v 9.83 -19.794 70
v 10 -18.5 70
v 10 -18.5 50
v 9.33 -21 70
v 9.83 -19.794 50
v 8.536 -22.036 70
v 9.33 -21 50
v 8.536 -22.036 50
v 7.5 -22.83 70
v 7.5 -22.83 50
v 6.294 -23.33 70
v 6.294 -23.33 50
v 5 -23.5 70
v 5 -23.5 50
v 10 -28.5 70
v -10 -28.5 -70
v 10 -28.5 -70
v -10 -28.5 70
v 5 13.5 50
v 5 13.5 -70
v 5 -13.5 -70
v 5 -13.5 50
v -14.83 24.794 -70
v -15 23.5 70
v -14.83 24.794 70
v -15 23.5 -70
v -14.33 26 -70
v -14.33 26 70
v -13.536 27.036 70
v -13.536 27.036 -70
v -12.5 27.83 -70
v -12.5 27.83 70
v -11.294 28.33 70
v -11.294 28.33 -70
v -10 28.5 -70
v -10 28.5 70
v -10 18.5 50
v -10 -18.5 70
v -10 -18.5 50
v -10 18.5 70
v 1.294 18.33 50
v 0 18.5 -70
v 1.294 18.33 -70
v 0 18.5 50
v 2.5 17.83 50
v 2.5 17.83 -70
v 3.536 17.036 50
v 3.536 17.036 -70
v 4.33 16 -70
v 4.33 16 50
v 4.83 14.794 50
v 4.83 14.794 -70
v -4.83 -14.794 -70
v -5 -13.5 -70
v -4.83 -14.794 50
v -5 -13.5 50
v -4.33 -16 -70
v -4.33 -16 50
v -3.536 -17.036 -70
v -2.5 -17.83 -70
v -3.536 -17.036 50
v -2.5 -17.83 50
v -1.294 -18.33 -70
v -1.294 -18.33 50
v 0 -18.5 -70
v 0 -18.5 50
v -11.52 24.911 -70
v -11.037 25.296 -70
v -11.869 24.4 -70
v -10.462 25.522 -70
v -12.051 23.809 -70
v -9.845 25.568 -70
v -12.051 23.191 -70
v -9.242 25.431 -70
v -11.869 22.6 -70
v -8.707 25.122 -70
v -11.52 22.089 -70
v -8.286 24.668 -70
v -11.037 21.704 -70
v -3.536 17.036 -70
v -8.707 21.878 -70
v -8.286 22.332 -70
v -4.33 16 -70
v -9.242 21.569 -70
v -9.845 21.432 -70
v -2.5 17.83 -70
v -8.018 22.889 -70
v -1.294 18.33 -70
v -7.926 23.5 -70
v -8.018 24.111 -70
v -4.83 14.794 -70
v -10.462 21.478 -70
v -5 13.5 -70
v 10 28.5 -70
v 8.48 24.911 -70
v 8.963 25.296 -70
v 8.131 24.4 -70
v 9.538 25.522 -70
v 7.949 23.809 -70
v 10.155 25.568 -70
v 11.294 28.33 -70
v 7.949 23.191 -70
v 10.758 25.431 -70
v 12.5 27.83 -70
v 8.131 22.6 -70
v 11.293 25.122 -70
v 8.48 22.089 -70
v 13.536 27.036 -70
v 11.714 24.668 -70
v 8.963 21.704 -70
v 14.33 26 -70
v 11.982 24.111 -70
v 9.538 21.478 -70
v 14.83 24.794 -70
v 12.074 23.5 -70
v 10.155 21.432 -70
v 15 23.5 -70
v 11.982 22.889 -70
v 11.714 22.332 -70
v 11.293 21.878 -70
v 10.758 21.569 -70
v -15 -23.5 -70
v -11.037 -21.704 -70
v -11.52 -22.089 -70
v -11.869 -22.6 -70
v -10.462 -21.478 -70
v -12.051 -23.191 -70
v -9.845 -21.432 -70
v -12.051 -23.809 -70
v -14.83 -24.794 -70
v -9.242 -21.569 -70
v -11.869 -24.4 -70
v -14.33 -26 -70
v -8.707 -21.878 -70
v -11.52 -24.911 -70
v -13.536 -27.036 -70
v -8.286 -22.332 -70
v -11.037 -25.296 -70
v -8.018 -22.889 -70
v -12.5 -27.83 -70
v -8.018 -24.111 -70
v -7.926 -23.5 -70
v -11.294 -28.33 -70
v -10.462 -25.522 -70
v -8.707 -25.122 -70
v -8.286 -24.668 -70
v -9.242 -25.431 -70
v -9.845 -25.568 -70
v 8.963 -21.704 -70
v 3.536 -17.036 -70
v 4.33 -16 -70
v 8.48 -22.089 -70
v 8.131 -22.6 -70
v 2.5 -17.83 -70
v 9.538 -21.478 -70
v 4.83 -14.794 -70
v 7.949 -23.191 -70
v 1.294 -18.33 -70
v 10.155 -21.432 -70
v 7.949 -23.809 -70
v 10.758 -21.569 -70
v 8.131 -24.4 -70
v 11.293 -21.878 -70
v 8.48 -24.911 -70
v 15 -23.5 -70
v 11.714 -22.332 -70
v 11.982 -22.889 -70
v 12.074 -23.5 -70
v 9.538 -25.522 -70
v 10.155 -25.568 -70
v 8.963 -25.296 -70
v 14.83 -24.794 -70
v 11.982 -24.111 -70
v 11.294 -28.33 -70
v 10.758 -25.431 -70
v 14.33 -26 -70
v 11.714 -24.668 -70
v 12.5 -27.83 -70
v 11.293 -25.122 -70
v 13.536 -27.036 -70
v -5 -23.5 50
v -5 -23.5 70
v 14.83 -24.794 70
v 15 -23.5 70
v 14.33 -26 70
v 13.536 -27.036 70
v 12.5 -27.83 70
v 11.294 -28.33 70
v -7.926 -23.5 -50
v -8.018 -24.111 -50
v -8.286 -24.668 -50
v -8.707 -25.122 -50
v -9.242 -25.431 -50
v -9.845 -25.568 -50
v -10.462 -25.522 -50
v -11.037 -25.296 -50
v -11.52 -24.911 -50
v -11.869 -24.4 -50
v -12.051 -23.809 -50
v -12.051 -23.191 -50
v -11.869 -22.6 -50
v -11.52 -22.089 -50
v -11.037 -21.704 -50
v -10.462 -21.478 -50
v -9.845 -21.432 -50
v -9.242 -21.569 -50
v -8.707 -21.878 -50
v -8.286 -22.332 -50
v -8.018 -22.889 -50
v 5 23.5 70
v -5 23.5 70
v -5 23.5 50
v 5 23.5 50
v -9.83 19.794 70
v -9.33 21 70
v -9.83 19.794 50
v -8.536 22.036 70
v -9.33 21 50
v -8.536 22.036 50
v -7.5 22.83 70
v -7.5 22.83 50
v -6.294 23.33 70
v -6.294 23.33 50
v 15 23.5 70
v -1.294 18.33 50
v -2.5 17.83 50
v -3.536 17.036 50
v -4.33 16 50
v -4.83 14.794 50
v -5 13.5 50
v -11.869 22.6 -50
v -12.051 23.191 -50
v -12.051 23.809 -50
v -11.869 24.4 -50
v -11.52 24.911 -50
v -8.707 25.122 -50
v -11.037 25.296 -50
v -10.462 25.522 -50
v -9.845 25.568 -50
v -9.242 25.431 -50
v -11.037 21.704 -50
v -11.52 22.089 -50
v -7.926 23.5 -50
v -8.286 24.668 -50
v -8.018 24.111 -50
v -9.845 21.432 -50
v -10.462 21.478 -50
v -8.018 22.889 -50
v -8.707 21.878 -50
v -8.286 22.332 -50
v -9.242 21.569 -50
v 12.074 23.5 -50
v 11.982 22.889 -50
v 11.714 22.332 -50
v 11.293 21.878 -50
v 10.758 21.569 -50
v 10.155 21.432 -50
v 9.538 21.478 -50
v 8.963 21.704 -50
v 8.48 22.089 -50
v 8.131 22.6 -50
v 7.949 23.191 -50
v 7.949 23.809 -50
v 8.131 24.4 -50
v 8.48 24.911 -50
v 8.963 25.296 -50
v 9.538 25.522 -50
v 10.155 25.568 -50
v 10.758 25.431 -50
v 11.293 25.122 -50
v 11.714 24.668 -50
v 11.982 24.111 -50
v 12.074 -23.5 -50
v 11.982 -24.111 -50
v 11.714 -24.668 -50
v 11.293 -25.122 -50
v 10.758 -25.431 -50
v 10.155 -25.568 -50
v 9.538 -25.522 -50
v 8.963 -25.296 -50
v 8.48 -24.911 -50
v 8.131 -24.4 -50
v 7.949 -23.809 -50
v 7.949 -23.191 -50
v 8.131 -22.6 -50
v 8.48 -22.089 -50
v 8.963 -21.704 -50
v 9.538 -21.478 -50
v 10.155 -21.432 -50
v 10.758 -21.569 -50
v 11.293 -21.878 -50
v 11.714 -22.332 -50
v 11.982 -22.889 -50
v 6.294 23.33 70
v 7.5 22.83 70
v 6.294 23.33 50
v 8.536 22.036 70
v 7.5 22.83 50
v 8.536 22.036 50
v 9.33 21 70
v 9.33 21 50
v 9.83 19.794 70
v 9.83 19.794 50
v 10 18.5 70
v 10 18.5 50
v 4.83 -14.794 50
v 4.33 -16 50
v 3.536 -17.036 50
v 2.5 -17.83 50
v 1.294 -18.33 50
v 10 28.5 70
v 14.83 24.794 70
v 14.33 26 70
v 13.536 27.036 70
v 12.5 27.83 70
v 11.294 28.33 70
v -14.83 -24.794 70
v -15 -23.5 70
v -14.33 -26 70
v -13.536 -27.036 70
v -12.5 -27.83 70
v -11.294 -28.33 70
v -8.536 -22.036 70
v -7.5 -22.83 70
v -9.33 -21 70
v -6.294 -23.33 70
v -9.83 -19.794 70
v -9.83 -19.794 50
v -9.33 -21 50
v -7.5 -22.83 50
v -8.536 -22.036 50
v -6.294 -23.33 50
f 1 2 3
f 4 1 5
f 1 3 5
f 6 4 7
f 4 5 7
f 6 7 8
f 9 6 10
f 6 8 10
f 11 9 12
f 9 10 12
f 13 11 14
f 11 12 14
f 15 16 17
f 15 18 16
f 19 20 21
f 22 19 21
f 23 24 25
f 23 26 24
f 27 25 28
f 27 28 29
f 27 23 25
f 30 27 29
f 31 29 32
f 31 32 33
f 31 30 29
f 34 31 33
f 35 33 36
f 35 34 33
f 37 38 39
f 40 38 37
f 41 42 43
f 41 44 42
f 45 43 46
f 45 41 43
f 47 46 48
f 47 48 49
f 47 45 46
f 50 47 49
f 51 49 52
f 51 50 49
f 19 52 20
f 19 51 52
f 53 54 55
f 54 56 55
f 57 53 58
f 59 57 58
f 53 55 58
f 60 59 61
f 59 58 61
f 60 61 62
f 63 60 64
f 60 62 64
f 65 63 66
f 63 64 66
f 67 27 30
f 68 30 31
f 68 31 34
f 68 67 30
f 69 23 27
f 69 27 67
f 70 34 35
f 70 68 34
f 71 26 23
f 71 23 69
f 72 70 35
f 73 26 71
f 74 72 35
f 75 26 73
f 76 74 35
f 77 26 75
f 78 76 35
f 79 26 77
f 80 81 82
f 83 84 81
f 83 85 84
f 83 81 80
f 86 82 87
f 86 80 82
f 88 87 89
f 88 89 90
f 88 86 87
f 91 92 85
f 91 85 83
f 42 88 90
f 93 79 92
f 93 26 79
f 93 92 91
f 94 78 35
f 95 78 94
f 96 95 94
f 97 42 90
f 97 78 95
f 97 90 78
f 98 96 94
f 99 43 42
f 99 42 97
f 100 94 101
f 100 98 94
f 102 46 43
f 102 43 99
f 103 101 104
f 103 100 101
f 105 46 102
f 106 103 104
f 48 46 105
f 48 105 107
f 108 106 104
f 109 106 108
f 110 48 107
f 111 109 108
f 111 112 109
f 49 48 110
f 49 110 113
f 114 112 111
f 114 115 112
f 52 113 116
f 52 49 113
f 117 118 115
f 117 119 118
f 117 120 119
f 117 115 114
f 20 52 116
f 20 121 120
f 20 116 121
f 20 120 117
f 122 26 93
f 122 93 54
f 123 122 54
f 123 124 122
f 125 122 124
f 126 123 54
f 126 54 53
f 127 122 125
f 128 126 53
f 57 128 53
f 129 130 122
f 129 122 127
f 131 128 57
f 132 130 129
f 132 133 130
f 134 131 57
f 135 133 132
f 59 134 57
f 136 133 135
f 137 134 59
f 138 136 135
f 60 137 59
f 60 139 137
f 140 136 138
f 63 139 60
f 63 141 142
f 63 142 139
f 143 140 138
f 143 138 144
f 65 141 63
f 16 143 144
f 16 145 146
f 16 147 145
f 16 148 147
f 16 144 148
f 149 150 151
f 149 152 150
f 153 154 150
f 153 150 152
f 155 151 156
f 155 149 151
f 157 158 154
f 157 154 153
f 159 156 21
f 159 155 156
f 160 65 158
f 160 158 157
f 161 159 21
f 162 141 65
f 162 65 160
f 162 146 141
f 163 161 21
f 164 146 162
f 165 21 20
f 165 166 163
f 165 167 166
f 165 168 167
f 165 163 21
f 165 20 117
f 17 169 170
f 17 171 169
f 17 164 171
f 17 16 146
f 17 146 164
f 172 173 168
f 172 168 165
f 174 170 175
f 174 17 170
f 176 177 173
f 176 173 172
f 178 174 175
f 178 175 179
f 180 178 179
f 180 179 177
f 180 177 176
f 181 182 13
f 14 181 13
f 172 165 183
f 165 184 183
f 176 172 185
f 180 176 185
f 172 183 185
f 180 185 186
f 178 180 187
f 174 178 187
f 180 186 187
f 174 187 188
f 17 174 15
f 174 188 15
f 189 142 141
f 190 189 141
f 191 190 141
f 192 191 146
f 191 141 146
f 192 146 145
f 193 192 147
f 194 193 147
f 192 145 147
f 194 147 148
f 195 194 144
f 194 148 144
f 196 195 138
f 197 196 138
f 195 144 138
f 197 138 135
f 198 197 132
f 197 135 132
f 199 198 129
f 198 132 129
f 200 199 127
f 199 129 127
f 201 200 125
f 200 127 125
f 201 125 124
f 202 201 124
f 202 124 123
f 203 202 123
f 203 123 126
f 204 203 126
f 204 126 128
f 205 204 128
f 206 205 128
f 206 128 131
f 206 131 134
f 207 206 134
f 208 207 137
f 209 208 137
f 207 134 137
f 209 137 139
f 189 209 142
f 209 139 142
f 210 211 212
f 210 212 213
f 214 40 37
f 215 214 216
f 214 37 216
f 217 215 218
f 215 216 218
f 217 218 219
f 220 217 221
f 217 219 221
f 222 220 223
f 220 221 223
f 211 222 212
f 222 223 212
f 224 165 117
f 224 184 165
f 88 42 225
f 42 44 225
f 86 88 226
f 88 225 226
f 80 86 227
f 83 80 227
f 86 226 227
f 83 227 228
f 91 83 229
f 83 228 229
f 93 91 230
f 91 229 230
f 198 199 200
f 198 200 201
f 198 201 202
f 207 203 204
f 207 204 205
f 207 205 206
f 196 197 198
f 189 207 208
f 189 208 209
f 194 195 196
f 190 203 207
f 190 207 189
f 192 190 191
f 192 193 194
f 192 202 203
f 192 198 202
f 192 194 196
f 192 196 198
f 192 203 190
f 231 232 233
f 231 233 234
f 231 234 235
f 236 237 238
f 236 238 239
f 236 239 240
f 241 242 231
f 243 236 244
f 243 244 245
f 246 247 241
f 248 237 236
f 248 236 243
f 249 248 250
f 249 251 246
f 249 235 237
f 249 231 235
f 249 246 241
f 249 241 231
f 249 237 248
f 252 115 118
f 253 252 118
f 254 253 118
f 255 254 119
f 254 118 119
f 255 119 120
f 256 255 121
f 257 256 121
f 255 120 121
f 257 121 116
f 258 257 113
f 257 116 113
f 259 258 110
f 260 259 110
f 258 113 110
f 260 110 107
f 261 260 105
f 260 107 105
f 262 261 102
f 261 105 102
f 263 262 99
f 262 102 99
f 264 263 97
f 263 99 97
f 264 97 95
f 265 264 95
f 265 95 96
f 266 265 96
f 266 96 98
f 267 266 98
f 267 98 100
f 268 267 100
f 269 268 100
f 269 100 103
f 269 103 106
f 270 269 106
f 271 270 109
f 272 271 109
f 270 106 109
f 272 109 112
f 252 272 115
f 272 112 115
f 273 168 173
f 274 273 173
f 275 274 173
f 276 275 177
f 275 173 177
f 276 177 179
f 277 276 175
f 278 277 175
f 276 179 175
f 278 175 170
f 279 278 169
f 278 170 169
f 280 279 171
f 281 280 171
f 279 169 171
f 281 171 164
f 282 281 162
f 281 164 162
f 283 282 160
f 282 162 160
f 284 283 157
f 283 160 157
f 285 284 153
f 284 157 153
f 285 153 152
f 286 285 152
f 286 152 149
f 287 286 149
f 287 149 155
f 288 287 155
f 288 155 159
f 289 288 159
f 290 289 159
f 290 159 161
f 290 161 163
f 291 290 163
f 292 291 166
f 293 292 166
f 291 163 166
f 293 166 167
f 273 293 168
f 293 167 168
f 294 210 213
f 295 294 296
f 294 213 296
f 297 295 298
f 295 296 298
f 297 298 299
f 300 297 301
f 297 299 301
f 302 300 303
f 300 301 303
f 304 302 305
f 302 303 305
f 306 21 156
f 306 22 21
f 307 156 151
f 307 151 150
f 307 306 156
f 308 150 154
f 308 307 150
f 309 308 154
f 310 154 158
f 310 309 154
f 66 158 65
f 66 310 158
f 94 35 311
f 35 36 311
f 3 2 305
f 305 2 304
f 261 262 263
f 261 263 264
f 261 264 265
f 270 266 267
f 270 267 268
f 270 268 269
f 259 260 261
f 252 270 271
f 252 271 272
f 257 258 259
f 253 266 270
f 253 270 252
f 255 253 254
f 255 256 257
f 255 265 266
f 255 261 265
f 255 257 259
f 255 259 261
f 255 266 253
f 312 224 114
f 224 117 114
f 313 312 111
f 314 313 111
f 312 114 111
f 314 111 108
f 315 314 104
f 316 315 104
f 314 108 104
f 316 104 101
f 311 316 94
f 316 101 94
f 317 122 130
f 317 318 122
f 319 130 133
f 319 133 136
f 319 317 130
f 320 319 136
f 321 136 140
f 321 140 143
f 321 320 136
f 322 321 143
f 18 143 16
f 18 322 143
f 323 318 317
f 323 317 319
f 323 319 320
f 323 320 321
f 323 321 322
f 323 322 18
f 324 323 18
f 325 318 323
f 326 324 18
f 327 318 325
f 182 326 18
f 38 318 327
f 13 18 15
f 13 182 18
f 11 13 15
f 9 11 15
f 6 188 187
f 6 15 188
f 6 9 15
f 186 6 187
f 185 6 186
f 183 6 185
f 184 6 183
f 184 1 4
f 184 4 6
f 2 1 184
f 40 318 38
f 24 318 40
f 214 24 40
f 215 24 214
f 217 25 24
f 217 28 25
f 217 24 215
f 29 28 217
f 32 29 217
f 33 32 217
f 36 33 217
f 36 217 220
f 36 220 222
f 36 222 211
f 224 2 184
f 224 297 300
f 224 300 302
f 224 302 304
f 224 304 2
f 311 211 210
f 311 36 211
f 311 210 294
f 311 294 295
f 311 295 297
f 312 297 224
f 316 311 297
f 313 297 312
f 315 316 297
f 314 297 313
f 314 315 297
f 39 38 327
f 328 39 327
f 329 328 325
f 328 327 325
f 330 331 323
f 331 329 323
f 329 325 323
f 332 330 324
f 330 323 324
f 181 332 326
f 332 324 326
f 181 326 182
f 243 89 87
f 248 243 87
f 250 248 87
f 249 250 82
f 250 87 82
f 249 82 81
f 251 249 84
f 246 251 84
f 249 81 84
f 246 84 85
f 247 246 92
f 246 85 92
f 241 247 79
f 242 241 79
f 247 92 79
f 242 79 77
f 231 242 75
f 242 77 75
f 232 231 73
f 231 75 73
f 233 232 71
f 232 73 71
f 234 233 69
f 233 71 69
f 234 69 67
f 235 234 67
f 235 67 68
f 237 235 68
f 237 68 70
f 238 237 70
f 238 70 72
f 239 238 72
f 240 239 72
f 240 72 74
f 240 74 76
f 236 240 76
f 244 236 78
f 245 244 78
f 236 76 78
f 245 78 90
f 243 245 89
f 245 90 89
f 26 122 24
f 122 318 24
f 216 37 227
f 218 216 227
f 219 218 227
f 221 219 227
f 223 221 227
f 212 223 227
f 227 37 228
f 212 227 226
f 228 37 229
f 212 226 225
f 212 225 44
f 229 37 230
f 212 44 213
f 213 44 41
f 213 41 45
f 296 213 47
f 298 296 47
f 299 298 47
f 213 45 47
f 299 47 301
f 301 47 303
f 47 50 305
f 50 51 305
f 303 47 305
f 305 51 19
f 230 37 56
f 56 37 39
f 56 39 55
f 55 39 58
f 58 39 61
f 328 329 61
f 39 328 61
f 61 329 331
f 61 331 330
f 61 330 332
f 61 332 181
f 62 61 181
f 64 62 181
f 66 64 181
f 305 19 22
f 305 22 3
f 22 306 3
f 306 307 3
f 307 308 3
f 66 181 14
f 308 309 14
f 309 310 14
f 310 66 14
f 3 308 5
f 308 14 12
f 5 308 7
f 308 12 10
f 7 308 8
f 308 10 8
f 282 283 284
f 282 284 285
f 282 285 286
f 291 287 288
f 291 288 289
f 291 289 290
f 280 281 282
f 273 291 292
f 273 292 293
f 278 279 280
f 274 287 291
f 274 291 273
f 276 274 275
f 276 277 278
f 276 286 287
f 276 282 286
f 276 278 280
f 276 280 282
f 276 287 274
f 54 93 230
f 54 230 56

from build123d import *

# Parameters (mm, degrees)
F0_W          = 30.0000000298
F0_H          = 57.0000000298
F0_W_2        = 20
F0_H_2        = 47
F1_DEPTH      = 70
F1_DEPTH_BACK = 70
F2_R          = 5
F3_W          = 10.0000004768
F3_H          = 37.0000004768
F4_DEPTH      = 120
F5_R          = 5
F6_R          = 2.074
F7_DEPTH      = 20


with BuildPart() as f1:
    # F0 (on Top) → F1 (new body, two sides)
    with BuildSketch(Plane.XY) as f1_sk:
        Rectangle(F0_W, F0_H)
        Rectangle(F0_W_2, F0_H_2, mode=Mode.SUBTRACT)
    extrude(amount=F1_DEPTH)
    extrude(f1_sk.sketch, amount=-F1_DEPTH_BACK)

    # F2
    f2_edges = [f1.edges().sort_by_distance(p)[0] for p in [
        (-10, 23.5, 0),
        (10, 23.5, 0),
        (-10, -23.5, 0),
        (10, -23.5, 0),
        (-15, 28.5, 0),
        (15, 28.5, 0),
        (15, -28.5, 0),
        (-15, -28.5, 0),
    ]]
    fillet(f2_edges, radius=F2_R)

    # F3 (on face) → F4 (join)
    with BuildSketch(Plane(origin=(0, 0, -70), x_dir=(1, 0, 0), z_dir=(0, 0, -1))):
        with BuildLine():
            Line((-10, 18.5), (-10, -18.5))
            ThreePointArc((-10, -18.5), (-8.5355339059, -22.0355339059), (-5, -23.5))
            Line((-5, -23.5), (5, -23.5))
            ThreePointArc((5, -23.5), (8.5355339059, -22.0355339059), (10, -18.5))
            Line((10, -18.5), (10, 18.5))
            ThreePointArc((10, 18.5), (8.5355339059, 22.0355339059), (5, 23.5))
            Line((5, 23.5), (-5, 23.5))
            ThreePointArc((-5, 23.5), (-8.5355339059, 22.0355339059), (-10, 18.5))
        make_face()
        Rectangle(F3_W, F3_H, mode=Mode.SUBTRACT)
    extrude(amount=-F4_DEPTH)

    # F5
    f5_edges = [f1.edges().sort_by_distance(p)[0] for p in [
        (-5, -18.5, -10),
        (5, -18.5, -10),
        (5, 18.5, -10),
        (-5, 18.5, -10),
    ]]
    fillet(f5_edges, radius=F5_R)

    # F6 (on face) → F7 (cut)
    with BuildSketch(Plane(origin=(0, 0, -70), x_dir=(1, 0, 0), z_dir=(0, 0, -1))):
        with Locations((-10.0000000149, 23.5000000149)):
            Circle(F6_R)
        with Locations((10.0000000149, 23.5000000149)):
            Circle(F6_R)
        with Locations((-10.0000000149, -23.5000000149)):
            Circle(F6_R)
        with Locations((10.0000000149, -23.5000000149)):
            Circle(F6_R)
    extrude(amount=-F7_DEPTH, mode=Mode.SUBTRACT)


solid = f1.part
